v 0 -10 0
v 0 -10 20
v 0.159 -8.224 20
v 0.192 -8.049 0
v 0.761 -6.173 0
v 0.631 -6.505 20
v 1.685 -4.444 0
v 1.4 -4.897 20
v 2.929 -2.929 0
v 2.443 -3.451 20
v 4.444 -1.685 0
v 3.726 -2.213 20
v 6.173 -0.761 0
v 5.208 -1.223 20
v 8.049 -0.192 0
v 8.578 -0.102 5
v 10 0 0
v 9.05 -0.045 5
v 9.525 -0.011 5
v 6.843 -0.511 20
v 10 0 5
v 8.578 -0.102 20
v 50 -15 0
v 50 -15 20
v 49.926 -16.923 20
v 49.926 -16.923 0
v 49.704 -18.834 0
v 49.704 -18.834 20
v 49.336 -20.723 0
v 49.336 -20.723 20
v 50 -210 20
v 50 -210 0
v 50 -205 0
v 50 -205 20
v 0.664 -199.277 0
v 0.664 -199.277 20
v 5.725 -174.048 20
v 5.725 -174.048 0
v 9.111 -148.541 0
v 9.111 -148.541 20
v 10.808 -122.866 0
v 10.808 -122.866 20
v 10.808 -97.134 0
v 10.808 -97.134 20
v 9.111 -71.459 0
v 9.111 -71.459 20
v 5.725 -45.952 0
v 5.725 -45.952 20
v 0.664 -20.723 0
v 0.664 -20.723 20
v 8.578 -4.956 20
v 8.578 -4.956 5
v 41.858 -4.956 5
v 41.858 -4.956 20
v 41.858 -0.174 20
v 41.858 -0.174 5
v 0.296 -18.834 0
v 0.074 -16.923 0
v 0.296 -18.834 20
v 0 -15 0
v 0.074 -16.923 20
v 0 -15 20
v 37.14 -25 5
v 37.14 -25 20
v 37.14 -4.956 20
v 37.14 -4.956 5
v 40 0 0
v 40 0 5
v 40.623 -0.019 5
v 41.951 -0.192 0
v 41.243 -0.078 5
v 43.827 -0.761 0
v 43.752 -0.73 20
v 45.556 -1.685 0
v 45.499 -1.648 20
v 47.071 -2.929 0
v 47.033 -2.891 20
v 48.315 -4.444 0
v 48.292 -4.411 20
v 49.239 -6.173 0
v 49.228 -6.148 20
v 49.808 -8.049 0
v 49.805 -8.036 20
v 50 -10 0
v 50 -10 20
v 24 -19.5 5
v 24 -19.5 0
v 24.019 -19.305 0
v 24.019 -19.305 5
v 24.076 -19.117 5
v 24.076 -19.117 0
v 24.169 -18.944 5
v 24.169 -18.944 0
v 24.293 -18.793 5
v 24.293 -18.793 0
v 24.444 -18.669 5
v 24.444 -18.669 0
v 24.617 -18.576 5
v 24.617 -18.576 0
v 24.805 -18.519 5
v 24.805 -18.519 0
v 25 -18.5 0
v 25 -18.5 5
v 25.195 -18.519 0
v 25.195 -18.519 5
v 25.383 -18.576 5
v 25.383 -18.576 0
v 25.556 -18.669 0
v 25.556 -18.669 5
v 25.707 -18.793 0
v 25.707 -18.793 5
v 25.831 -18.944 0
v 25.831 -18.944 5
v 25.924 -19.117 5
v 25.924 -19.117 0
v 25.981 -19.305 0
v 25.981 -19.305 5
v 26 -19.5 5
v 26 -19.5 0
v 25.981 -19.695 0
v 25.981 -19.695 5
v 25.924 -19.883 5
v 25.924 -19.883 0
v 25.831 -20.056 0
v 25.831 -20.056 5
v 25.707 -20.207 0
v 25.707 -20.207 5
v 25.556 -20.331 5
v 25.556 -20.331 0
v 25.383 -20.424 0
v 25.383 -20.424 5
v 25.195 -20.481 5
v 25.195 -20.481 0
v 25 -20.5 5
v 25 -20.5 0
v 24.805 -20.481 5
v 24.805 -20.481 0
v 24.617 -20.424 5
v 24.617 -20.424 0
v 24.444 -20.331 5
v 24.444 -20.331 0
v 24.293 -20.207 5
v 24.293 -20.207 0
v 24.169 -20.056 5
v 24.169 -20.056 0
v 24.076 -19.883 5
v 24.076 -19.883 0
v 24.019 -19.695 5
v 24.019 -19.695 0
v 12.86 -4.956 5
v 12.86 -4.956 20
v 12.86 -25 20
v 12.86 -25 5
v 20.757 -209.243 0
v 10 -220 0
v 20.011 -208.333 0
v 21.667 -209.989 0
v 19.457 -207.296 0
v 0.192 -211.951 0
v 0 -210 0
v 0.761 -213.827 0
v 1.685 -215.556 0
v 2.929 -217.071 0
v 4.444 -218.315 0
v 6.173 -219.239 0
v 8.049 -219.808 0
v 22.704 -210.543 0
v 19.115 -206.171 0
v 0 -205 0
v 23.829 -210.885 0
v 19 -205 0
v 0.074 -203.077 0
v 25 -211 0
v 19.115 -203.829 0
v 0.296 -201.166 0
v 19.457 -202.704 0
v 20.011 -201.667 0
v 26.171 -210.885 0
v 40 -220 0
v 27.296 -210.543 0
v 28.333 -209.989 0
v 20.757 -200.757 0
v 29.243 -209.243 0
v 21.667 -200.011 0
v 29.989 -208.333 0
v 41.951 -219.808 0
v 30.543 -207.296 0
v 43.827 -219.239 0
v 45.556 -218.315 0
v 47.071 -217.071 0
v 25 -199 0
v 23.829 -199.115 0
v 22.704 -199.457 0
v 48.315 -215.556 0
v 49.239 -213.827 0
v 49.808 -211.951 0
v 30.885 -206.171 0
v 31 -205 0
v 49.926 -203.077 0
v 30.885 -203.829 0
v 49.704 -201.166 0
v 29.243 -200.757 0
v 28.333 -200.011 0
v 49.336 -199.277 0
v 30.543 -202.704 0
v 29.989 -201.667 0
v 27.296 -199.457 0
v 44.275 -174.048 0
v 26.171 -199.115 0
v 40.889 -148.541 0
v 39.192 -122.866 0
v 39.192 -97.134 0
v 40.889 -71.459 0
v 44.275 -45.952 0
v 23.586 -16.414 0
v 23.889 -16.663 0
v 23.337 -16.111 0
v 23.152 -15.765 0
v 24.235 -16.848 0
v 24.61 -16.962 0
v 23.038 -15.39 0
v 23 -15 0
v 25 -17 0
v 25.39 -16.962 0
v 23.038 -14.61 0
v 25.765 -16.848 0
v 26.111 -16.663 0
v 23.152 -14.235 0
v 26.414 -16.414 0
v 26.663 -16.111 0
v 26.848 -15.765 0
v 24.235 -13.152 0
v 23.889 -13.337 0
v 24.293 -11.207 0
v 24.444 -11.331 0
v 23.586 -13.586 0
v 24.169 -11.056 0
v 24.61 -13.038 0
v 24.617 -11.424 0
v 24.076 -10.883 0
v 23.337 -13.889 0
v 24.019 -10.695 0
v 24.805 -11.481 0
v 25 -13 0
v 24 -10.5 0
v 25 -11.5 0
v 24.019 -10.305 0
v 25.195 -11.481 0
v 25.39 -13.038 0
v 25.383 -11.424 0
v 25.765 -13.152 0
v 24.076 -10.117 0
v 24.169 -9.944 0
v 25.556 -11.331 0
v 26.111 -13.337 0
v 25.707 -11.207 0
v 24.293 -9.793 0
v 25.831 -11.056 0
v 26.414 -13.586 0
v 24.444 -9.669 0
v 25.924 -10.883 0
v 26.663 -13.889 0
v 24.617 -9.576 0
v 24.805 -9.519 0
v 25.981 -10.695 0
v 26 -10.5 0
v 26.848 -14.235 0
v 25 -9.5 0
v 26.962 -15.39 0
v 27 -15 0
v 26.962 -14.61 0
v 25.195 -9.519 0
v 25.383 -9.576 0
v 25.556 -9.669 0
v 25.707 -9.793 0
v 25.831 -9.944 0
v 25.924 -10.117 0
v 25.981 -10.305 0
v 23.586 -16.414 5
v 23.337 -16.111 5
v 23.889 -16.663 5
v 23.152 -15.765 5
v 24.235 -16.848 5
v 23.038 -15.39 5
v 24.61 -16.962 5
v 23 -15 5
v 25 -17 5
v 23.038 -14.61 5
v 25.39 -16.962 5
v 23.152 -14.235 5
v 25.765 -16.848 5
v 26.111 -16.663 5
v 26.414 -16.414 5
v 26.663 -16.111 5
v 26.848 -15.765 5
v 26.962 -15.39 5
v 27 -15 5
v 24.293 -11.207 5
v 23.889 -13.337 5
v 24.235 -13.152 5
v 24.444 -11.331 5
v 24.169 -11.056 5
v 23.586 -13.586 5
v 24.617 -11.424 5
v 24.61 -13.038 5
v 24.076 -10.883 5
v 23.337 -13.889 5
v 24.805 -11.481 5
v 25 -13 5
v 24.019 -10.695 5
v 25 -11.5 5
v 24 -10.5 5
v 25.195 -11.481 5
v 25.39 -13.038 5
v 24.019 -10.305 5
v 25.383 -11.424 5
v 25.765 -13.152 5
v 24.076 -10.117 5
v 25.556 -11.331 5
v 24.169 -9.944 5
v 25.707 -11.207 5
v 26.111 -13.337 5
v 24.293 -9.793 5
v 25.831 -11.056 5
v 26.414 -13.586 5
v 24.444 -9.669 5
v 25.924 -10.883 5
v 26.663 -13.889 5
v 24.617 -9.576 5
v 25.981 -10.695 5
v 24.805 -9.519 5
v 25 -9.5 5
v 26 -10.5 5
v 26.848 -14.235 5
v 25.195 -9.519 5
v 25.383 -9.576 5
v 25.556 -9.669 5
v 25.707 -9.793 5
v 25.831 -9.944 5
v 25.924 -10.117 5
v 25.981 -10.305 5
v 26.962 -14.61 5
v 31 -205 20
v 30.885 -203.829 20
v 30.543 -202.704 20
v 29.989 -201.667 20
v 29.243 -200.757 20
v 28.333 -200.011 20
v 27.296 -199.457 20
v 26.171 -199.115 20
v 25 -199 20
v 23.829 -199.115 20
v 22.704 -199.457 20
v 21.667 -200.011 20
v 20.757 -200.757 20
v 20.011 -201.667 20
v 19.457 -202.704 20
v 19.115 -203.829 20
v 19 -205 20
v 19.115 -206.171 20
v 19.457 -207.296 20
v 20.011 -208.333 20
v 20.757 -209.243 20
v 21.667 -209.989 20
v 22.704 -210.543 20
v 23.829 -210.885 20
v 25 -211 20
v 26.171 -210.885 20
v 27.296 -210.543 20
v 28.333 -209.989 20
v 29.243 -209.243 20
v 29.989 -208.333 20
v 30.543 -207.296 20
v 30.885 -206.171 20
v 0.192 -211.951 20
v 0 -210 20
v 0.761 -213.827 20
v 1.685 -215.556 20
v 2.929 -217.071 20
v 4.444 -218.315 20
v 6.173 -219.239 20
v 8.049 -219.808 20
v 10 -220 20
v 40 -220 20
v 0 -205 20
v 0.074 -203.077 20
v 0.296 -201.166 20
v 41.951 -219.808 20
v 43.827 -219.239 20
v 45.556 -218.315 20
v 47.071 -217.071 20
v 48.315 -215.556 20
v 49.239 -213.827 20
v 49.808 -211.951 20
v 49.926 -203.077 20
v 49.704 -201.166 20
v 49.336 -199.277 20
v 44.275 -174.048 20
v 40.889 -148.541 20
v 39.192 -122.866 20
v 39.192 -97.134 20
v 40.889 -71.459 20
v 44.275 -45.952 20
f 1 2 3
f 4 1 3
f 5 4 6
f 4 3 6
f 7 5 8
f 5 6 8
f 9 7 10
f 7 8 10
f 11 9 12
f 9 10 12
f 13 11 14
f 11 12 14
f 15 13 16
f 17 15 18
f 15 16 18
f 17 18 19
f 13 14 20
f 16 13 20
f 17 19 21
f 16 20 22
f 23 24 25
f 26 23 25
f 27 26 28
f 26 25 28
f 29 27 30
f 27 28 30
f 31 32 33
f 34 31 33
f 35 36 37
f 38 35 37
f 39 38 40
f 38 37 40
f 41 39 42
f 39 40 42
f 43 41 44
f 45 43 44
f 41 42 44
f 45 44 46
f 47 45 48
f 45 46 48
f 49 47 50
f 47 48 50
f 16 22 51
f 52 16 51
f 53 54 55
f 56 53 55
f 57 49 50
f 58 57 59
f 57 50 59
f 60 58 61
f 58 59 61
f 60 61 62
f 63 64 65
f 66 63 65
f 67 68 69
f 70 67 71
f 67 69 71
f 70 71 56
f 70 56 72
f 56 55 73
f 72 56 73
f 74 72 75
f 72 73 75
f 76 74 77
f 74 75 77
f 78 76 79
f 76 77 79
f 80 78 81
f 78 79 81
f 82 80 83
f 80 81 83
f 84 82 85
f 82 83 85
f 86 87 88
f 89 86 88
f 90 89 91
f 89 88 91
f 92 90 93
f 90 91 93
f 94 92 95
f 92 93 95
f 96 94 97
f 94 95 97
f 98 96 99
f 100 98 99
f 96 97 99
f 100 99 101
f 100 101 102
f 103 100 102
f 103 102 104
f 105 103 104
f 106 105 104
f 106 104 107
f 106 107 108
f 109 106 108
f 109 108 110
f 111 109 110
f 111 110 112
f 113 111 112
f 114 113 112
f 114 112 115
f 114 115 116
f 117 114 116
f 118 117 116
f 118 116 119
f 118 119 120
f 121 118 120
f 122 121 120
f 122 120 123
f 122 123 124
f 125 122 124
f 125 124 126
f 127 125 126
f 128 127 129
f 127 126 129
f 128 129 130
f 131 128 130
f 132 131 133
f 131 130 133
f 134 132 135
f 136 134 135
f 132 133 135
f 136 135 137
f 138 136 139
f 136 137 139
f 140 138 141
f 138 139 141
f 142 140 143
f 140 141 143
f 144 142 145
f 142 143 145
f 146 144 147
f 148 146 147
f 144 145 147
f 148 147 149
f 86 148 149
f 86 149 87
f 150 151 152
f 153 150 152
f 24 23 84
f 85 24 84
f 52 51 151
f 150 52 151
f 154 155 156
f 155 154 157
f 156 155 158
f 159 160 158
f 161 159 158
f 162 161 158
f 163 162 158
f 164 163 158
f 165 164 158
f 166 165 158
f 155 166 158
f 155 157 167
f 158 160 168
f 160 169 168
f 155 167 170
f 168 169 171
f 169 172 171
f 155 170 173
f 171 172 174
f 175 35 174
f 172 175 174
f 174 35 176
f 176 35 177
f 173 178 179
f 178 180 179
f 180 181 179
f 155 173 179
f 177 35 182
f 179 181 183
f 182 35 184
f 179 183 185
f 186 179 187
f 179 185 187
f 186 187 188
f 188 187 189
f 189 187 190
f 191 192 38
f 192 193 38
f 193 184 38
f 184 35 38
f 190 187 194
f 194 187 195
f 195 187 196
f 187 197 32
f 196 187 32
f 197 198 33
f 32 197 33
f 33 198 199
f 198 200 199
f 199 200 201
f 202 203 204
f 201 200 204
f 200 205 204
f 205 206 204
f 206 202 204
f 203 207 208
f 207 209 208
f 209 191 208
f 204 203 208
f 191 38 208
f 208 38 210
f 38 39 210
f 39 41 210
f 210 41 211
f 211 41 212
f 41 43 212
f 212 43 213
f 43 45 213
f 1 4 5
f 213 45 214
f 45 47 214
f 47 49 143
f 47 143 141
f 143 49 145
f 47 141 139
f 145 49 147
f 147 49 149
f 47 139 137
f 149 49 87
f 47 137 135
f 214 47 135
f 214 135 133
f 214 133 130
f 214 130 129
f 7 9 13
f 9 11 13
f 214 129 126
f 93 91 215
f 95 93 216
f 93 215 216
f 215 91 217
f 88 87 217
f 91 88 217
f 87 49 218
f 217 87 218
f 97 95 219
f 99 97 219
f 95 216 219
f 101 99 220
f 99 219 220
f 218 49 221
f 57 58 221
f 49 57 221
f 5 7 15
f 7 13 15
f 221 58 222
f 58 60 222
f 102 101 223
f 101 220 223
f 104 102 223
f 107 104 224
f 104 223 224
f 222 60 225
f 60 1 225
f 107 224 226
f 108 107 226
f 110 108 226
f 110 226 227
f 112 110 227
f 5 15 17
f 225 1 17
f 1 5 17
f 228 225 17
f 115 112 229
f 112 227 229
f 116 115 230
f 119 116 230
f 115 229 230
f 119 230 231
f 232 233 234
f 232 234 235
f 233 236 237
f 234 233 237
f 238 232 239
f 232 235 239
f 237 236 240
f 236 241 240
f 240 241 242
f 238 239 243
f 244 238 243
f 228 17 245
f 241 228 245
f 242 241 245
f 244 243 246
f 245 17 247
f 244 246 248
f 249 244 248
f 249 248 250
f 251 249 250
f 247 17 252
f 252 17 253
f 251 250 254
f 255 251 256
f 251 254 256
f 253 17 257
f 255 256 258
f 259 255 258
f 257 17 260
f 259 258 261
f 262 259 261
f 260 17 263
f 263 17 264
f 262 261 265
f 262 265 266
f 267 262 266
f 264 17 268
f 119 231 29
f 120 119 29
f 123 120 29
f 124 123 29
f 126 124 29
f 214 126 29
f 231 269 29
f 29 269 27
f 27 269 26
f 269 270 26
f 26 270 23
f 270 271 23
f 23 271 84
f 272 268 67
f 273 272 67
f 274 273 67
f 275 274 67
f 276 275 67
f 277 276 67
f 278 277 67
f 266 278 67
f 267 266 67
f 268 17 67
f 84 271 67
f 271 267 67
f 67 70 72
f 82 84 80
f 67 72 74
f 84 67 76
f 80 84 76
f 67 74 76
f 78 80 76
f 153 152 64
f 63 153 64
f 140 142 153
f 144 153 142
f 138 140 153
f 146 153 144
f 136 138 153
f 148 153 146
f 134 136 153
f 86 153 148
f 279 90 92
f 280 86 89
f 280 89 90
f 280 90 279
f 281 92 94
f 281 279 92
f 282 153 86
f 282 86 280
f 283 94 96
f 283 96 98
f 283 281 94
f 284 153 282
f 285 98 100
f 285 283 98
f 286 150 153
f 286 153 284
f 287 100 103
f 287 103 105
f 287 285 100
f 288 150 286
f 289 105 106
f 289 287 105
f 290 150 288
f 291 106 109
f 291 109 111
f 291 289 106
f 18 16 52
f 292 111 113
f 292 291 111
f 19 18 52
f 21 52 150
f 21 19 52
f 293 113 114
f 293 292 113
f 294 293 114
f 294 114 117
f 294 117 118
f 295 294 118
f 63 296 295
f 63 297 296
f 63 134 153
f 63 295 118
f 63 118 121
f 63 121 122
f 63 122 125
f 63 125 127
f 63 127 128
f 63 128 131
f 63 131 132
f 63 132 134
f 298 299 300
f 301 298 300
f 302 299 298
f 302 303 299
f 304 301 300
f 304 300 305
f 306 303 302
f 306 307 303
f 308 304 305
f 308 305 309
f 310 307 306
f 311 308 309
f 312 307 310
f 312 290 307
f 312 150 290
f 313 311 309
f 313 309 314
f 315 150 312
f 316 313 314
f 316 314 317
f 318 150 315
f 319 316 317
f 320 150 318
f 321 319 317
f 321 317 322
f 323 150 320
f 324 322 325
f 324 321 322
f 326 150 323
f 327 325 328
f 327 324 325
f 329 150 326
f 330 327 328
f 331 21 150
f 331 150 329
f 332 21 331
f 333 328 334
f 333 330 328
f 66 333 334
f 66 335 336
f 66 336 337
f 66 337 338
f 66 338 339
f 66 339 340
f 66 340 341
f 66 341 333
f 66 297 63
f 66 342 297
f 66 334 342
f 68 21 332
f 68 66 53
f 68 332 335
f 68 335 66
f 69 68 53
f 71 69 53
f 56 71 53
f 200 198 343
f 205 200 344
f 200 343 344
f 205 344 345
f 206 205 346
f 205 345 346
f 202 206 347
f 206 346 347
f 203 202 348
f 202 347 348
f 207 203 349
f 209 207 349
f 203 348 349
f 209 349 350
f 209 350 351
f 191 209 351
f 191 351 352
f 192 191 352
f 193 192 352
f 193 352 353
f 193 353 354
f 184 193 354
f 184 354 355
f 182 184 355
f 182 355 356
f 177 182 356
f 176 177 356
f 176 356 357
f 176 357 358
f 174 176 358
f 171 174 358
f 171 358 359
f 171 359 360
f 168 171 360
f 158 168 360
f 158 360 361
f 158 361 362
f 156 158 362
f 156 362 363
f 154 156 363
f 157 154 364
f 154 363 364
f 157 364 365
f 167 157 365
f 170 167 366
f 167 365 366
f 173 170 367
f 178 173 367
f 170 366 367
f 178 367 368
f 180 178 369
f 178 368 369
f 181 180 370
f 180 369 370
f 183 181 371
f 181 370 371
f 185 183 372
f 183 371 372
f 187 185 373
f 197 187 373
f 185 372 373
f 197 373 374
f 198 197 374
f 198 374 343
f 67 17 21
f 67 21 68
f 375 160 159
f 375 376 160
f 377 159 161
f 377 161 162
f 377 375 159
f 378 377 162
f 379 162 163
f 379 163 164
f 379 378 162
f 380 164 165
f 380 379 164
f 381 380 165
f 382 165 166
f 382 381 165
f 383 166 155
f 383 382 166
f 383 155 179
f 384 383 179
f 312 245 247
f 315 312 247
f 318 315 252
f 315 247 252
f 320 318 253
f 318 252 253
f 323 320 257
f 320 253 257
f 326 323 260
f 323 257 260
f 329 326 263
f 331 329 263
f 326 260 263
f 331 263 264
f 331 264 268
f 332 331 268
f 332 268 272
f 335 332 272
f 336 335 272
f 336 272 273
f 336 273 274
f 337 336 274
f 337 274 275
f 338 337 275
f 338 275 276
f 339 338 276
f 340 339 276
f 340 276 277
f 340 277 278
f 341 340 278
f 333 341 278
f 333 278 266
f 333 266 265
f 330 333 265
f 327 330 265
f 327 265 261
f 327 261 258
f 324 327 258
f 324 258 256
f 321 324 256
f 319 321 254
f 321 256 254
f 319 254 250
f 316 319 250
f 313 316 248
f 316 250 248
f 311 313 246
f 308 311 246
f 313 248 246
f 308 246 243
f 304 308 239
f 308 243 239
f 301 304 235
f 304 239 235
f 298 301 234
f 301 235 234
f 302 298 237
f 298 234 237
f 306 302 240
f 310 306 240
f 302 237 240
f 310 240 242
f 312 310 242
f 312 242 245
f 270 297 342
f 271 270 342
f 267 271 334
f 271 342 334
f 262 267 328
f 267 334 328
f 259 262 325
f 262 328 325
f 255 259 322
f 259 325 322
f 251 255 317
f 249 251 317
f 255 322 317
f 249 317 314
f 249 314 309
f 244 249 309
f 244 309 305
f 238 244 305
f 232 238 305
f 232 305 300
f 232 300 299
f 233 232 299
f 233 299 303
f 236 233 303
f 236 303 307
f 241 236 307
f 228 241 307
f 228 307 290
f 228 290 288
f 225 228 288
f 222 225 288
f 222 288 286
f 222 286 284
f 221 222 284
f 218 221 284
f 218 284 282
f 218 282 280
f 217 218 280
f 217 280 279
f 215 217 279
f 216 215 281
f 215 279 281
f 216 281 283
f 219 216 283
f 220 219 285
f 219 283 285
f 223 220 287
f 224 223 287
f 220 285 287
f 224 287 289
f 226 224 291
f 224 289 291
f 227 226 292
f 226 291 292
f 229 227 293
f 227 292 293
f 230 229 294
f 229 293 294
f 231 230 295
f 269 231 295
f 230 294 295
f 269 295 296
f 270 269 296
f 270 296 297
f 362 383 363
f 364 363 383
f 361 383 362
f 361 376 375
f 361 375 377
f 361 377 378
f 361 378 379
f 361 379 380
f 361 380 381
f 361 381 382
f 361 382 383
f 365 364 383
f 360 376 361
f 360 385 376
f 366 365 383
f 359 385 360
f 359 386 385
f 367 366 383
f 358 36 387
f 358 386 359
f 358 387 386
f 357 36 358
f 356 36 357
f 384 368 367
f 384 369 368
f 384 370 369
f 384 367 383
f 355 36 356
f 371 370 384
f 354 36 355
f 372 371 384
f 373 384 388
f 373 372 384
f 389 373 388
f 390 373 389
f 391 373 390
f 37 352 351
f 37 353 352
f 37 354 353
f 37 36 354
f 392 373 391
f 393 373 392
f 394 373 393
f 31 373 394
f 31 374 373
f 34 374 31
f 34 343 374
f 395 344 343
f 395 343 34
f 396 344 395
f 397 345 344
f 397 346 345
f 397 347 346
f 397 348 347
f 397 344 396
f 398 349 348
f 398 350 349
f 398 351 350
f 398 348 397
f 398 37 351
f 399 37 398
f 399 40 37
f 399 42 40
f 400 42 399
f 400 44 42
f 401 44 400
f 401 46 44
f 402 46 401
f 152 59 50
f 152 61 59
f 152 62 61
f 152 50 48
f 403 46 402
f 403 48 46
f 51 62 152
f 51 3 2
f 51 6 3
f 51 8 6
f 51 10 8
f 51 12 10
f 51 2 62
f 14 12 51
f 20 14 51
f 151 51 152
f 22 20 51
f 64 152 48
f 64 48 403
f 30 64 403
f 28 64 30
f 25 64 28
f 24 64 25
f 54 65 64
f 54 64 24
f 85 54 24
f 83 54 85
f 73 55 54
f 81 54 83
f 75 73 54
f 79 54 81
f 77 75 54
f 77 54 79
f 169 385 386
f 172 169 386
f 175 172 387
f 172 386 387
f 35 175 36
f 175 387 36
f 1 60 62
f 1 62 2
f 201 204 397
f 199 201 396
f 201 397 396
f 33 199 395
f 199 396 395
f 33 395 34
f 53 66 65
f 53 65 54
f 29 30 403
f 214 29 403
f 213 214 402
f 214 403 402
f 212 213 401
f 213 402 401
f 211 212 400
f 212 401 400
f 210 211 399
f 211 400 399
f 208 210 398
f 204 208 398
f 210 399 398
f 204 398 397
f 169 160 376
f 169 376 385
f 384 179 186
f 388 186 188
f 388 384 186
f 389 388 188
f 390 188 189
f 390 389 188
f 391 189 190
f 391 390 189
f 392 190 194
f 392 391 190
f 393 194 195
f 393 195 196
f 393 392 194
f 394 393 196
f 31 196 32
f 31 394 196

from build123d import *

# Parameters (mm, degrees)
SKETCH1_W           = 50
SKETCH1_H           = 220
BOSS_EXTRUDE1_DEPTH = 20
SKETCH2_R           = 2
SKETCH2_R_2         = 6
CUT_EXTRUDE2_DEPTH  = 34
FILLET2_R           = 10
CUT_EXTRUDE3_DEPTH  = 15
SKETCH7_R           = 1
CUT_EXTRUDE4_DEPTH  = 15
CUT_EXTRUDE6_DEPTH  = 15
CUT_EXTRUDE7_DEPTH  = 53


with BuildPart() as part:
    # Sketch1 → Boss-Extrude1 (new body)
    with BuildSketch(Plane.XY):
        with Locations((25, -110)):
            Rectangle(SKETCH1_W, SKETCH1_H)
    extrude(amount=BOSS_EXTRUDE1_DEPTH)

    # Sketch2 → Cut-Extrude2 (cut)
    with BuildSketch(Plane.XY.offset(20)):
        with Locations((25, -15)):
            Circle(SKETCH2_R)
        with Locations((25, -205)):
            Circle(SKETCH2_R_2)
    extrude(amount=-CUT_EXTRUDE2_DEPTH, mode=Mode.SUBTRACT)

    # Fillet2
    fillet2_edges = [part.edges().sort_by_distance(p)[0] for p in [
        (0, 0, 10),
        (50, 0, 10),
        (50, -220, 10),
        (0, -220, 10),
    ]]
    fillet(fillet2_edges, radius=FILLET2_R)

    # Sketch4 → Cut-Extrude3 (cut)
    with BuildSketch(Plane.XY.offset(20)):
        Polygon((25, -25), (37.14, -25), (37.14, 0), (12.86, 0), (12.86, -25), align=None)
    extrude(amount=-CUT_EXTRUDE3_DEPTH, mode=Mode.SUBTRACT)

    # Sketch7 → Cut-Extrude4 (cut)
    with BuildSketch(Plane(origin=(0, 0, 0), x_dir=(-1, 0, 0), z_dir=(0, 0, -1))):
        with Locations((-25, -10.5)):
            Circle(SKETCH7_R)
        with Locations((-25, -19.5)):
            Circle(SKETCH7_R)
    extrude(amount=-CUT_EXTRUDE4_DEPTH, mode=Mode.SUBTRACT)

    # Sketch8 → Cut-Extrude6 (cut)
    with BuildSketch(Plane.XY.offset(20)):
        with BuildLine():
            Line((12.86, -4.956404509), (37.14, -4.956404509))
            Line((37.14, -4.956404509), (37.14, 0))
            Line((37.14, 0), (40, 0))
            ThreePointArc((40, 0), (40.933059212, -0.043625132), (41.857977457, -0.174119899))
            Line((41.857977457, -0.174119899), (41.857977457, 3.191267917))
            Line((41.857977457, 3.191267917), (8.577977457, 3.191267917))
            Line((8.577977457, 3.191267917), (8.577977457, -0.101623775))
            ThreePointArc((8.577977457, -0.101623775), (9.287175424, -0.025438299), (10, 0))
            Line((10, 0), (12.86, 0))
            Line((12.86, 0), (12.86, -4.956404509))
        make_face()
        with BuildLine():
            Line((8.577977457, -4.956404509), (12.86, -4.956404509))
            Line((12.86, -4.956404509), (12.86, 0))
            Line((12.86, 0), (10, 0))
            ThreePointArc((10, 0), (9.287175424, -0.025438299), (8.577977457, -0.101623775))
            Line((8.577977457, -0.101623775), (8.577977457, -4.956404509))
        make_face()
        with BuildLine():
            Line((37.14, 0), (37.14, -4.956404509))
            Line((37.14, -4.956404509), (41.857977457, -4.956404509))
            Line((41.857977457, -4.956404509), (41.857977457, -0.174119899))
            ThreePointArc((41.857977457, -0.174119899), (40.933059212, -0.043625132), (40, 0))
            Line((40, 0), (37.14, 0))
        make_face()
    extrude(amount=-CUT_EXTRUDE6_DEPTH, mode=Mode.SUBTRACT)

    # Sketch9 → Cut-Extrude7 (cut)
    with BuildSketch(Plane.XY.offset(20)):
        with BuildLine():
            ThreePointArc((49.336156478, -199.277108434), (49.833484572, -202.119367426), (50, -205))
            Line((50, -205), (50, -202.054385429))
            Line((50, -202.054385429), (50, -15))
            ThreePointArc((50, -15), (49.833484572, -17.880632574), (49.336156478, -20.722891566))
            ThreePointArc((49.336156478, -20.722891566), (38.980197534, -110), (49.336156478, -199.277108434))
        make_face()
        with BuildLine():
            Line((0, -19.137020496), (0, -205))
            ThreePointArc((0, -205), (0.166515428, -202.119367426), (0.663843522, -199.277108434))
            ThreePointArc((0.663843522, -199.277108434), (11.019802466, -110), (0.663843522, -20.722891566))
            ThreePointArc((0.663843522, -20.722891566), (0.166515428, -17.880632574), (0, -15))
            Line((0, -15), (0, -19.137020496))
        make_face()
    extrude(amount=-CUT_EXTRUDE7_DEPTH, mode=Mode.SUBTRACT)


solid = part.part
